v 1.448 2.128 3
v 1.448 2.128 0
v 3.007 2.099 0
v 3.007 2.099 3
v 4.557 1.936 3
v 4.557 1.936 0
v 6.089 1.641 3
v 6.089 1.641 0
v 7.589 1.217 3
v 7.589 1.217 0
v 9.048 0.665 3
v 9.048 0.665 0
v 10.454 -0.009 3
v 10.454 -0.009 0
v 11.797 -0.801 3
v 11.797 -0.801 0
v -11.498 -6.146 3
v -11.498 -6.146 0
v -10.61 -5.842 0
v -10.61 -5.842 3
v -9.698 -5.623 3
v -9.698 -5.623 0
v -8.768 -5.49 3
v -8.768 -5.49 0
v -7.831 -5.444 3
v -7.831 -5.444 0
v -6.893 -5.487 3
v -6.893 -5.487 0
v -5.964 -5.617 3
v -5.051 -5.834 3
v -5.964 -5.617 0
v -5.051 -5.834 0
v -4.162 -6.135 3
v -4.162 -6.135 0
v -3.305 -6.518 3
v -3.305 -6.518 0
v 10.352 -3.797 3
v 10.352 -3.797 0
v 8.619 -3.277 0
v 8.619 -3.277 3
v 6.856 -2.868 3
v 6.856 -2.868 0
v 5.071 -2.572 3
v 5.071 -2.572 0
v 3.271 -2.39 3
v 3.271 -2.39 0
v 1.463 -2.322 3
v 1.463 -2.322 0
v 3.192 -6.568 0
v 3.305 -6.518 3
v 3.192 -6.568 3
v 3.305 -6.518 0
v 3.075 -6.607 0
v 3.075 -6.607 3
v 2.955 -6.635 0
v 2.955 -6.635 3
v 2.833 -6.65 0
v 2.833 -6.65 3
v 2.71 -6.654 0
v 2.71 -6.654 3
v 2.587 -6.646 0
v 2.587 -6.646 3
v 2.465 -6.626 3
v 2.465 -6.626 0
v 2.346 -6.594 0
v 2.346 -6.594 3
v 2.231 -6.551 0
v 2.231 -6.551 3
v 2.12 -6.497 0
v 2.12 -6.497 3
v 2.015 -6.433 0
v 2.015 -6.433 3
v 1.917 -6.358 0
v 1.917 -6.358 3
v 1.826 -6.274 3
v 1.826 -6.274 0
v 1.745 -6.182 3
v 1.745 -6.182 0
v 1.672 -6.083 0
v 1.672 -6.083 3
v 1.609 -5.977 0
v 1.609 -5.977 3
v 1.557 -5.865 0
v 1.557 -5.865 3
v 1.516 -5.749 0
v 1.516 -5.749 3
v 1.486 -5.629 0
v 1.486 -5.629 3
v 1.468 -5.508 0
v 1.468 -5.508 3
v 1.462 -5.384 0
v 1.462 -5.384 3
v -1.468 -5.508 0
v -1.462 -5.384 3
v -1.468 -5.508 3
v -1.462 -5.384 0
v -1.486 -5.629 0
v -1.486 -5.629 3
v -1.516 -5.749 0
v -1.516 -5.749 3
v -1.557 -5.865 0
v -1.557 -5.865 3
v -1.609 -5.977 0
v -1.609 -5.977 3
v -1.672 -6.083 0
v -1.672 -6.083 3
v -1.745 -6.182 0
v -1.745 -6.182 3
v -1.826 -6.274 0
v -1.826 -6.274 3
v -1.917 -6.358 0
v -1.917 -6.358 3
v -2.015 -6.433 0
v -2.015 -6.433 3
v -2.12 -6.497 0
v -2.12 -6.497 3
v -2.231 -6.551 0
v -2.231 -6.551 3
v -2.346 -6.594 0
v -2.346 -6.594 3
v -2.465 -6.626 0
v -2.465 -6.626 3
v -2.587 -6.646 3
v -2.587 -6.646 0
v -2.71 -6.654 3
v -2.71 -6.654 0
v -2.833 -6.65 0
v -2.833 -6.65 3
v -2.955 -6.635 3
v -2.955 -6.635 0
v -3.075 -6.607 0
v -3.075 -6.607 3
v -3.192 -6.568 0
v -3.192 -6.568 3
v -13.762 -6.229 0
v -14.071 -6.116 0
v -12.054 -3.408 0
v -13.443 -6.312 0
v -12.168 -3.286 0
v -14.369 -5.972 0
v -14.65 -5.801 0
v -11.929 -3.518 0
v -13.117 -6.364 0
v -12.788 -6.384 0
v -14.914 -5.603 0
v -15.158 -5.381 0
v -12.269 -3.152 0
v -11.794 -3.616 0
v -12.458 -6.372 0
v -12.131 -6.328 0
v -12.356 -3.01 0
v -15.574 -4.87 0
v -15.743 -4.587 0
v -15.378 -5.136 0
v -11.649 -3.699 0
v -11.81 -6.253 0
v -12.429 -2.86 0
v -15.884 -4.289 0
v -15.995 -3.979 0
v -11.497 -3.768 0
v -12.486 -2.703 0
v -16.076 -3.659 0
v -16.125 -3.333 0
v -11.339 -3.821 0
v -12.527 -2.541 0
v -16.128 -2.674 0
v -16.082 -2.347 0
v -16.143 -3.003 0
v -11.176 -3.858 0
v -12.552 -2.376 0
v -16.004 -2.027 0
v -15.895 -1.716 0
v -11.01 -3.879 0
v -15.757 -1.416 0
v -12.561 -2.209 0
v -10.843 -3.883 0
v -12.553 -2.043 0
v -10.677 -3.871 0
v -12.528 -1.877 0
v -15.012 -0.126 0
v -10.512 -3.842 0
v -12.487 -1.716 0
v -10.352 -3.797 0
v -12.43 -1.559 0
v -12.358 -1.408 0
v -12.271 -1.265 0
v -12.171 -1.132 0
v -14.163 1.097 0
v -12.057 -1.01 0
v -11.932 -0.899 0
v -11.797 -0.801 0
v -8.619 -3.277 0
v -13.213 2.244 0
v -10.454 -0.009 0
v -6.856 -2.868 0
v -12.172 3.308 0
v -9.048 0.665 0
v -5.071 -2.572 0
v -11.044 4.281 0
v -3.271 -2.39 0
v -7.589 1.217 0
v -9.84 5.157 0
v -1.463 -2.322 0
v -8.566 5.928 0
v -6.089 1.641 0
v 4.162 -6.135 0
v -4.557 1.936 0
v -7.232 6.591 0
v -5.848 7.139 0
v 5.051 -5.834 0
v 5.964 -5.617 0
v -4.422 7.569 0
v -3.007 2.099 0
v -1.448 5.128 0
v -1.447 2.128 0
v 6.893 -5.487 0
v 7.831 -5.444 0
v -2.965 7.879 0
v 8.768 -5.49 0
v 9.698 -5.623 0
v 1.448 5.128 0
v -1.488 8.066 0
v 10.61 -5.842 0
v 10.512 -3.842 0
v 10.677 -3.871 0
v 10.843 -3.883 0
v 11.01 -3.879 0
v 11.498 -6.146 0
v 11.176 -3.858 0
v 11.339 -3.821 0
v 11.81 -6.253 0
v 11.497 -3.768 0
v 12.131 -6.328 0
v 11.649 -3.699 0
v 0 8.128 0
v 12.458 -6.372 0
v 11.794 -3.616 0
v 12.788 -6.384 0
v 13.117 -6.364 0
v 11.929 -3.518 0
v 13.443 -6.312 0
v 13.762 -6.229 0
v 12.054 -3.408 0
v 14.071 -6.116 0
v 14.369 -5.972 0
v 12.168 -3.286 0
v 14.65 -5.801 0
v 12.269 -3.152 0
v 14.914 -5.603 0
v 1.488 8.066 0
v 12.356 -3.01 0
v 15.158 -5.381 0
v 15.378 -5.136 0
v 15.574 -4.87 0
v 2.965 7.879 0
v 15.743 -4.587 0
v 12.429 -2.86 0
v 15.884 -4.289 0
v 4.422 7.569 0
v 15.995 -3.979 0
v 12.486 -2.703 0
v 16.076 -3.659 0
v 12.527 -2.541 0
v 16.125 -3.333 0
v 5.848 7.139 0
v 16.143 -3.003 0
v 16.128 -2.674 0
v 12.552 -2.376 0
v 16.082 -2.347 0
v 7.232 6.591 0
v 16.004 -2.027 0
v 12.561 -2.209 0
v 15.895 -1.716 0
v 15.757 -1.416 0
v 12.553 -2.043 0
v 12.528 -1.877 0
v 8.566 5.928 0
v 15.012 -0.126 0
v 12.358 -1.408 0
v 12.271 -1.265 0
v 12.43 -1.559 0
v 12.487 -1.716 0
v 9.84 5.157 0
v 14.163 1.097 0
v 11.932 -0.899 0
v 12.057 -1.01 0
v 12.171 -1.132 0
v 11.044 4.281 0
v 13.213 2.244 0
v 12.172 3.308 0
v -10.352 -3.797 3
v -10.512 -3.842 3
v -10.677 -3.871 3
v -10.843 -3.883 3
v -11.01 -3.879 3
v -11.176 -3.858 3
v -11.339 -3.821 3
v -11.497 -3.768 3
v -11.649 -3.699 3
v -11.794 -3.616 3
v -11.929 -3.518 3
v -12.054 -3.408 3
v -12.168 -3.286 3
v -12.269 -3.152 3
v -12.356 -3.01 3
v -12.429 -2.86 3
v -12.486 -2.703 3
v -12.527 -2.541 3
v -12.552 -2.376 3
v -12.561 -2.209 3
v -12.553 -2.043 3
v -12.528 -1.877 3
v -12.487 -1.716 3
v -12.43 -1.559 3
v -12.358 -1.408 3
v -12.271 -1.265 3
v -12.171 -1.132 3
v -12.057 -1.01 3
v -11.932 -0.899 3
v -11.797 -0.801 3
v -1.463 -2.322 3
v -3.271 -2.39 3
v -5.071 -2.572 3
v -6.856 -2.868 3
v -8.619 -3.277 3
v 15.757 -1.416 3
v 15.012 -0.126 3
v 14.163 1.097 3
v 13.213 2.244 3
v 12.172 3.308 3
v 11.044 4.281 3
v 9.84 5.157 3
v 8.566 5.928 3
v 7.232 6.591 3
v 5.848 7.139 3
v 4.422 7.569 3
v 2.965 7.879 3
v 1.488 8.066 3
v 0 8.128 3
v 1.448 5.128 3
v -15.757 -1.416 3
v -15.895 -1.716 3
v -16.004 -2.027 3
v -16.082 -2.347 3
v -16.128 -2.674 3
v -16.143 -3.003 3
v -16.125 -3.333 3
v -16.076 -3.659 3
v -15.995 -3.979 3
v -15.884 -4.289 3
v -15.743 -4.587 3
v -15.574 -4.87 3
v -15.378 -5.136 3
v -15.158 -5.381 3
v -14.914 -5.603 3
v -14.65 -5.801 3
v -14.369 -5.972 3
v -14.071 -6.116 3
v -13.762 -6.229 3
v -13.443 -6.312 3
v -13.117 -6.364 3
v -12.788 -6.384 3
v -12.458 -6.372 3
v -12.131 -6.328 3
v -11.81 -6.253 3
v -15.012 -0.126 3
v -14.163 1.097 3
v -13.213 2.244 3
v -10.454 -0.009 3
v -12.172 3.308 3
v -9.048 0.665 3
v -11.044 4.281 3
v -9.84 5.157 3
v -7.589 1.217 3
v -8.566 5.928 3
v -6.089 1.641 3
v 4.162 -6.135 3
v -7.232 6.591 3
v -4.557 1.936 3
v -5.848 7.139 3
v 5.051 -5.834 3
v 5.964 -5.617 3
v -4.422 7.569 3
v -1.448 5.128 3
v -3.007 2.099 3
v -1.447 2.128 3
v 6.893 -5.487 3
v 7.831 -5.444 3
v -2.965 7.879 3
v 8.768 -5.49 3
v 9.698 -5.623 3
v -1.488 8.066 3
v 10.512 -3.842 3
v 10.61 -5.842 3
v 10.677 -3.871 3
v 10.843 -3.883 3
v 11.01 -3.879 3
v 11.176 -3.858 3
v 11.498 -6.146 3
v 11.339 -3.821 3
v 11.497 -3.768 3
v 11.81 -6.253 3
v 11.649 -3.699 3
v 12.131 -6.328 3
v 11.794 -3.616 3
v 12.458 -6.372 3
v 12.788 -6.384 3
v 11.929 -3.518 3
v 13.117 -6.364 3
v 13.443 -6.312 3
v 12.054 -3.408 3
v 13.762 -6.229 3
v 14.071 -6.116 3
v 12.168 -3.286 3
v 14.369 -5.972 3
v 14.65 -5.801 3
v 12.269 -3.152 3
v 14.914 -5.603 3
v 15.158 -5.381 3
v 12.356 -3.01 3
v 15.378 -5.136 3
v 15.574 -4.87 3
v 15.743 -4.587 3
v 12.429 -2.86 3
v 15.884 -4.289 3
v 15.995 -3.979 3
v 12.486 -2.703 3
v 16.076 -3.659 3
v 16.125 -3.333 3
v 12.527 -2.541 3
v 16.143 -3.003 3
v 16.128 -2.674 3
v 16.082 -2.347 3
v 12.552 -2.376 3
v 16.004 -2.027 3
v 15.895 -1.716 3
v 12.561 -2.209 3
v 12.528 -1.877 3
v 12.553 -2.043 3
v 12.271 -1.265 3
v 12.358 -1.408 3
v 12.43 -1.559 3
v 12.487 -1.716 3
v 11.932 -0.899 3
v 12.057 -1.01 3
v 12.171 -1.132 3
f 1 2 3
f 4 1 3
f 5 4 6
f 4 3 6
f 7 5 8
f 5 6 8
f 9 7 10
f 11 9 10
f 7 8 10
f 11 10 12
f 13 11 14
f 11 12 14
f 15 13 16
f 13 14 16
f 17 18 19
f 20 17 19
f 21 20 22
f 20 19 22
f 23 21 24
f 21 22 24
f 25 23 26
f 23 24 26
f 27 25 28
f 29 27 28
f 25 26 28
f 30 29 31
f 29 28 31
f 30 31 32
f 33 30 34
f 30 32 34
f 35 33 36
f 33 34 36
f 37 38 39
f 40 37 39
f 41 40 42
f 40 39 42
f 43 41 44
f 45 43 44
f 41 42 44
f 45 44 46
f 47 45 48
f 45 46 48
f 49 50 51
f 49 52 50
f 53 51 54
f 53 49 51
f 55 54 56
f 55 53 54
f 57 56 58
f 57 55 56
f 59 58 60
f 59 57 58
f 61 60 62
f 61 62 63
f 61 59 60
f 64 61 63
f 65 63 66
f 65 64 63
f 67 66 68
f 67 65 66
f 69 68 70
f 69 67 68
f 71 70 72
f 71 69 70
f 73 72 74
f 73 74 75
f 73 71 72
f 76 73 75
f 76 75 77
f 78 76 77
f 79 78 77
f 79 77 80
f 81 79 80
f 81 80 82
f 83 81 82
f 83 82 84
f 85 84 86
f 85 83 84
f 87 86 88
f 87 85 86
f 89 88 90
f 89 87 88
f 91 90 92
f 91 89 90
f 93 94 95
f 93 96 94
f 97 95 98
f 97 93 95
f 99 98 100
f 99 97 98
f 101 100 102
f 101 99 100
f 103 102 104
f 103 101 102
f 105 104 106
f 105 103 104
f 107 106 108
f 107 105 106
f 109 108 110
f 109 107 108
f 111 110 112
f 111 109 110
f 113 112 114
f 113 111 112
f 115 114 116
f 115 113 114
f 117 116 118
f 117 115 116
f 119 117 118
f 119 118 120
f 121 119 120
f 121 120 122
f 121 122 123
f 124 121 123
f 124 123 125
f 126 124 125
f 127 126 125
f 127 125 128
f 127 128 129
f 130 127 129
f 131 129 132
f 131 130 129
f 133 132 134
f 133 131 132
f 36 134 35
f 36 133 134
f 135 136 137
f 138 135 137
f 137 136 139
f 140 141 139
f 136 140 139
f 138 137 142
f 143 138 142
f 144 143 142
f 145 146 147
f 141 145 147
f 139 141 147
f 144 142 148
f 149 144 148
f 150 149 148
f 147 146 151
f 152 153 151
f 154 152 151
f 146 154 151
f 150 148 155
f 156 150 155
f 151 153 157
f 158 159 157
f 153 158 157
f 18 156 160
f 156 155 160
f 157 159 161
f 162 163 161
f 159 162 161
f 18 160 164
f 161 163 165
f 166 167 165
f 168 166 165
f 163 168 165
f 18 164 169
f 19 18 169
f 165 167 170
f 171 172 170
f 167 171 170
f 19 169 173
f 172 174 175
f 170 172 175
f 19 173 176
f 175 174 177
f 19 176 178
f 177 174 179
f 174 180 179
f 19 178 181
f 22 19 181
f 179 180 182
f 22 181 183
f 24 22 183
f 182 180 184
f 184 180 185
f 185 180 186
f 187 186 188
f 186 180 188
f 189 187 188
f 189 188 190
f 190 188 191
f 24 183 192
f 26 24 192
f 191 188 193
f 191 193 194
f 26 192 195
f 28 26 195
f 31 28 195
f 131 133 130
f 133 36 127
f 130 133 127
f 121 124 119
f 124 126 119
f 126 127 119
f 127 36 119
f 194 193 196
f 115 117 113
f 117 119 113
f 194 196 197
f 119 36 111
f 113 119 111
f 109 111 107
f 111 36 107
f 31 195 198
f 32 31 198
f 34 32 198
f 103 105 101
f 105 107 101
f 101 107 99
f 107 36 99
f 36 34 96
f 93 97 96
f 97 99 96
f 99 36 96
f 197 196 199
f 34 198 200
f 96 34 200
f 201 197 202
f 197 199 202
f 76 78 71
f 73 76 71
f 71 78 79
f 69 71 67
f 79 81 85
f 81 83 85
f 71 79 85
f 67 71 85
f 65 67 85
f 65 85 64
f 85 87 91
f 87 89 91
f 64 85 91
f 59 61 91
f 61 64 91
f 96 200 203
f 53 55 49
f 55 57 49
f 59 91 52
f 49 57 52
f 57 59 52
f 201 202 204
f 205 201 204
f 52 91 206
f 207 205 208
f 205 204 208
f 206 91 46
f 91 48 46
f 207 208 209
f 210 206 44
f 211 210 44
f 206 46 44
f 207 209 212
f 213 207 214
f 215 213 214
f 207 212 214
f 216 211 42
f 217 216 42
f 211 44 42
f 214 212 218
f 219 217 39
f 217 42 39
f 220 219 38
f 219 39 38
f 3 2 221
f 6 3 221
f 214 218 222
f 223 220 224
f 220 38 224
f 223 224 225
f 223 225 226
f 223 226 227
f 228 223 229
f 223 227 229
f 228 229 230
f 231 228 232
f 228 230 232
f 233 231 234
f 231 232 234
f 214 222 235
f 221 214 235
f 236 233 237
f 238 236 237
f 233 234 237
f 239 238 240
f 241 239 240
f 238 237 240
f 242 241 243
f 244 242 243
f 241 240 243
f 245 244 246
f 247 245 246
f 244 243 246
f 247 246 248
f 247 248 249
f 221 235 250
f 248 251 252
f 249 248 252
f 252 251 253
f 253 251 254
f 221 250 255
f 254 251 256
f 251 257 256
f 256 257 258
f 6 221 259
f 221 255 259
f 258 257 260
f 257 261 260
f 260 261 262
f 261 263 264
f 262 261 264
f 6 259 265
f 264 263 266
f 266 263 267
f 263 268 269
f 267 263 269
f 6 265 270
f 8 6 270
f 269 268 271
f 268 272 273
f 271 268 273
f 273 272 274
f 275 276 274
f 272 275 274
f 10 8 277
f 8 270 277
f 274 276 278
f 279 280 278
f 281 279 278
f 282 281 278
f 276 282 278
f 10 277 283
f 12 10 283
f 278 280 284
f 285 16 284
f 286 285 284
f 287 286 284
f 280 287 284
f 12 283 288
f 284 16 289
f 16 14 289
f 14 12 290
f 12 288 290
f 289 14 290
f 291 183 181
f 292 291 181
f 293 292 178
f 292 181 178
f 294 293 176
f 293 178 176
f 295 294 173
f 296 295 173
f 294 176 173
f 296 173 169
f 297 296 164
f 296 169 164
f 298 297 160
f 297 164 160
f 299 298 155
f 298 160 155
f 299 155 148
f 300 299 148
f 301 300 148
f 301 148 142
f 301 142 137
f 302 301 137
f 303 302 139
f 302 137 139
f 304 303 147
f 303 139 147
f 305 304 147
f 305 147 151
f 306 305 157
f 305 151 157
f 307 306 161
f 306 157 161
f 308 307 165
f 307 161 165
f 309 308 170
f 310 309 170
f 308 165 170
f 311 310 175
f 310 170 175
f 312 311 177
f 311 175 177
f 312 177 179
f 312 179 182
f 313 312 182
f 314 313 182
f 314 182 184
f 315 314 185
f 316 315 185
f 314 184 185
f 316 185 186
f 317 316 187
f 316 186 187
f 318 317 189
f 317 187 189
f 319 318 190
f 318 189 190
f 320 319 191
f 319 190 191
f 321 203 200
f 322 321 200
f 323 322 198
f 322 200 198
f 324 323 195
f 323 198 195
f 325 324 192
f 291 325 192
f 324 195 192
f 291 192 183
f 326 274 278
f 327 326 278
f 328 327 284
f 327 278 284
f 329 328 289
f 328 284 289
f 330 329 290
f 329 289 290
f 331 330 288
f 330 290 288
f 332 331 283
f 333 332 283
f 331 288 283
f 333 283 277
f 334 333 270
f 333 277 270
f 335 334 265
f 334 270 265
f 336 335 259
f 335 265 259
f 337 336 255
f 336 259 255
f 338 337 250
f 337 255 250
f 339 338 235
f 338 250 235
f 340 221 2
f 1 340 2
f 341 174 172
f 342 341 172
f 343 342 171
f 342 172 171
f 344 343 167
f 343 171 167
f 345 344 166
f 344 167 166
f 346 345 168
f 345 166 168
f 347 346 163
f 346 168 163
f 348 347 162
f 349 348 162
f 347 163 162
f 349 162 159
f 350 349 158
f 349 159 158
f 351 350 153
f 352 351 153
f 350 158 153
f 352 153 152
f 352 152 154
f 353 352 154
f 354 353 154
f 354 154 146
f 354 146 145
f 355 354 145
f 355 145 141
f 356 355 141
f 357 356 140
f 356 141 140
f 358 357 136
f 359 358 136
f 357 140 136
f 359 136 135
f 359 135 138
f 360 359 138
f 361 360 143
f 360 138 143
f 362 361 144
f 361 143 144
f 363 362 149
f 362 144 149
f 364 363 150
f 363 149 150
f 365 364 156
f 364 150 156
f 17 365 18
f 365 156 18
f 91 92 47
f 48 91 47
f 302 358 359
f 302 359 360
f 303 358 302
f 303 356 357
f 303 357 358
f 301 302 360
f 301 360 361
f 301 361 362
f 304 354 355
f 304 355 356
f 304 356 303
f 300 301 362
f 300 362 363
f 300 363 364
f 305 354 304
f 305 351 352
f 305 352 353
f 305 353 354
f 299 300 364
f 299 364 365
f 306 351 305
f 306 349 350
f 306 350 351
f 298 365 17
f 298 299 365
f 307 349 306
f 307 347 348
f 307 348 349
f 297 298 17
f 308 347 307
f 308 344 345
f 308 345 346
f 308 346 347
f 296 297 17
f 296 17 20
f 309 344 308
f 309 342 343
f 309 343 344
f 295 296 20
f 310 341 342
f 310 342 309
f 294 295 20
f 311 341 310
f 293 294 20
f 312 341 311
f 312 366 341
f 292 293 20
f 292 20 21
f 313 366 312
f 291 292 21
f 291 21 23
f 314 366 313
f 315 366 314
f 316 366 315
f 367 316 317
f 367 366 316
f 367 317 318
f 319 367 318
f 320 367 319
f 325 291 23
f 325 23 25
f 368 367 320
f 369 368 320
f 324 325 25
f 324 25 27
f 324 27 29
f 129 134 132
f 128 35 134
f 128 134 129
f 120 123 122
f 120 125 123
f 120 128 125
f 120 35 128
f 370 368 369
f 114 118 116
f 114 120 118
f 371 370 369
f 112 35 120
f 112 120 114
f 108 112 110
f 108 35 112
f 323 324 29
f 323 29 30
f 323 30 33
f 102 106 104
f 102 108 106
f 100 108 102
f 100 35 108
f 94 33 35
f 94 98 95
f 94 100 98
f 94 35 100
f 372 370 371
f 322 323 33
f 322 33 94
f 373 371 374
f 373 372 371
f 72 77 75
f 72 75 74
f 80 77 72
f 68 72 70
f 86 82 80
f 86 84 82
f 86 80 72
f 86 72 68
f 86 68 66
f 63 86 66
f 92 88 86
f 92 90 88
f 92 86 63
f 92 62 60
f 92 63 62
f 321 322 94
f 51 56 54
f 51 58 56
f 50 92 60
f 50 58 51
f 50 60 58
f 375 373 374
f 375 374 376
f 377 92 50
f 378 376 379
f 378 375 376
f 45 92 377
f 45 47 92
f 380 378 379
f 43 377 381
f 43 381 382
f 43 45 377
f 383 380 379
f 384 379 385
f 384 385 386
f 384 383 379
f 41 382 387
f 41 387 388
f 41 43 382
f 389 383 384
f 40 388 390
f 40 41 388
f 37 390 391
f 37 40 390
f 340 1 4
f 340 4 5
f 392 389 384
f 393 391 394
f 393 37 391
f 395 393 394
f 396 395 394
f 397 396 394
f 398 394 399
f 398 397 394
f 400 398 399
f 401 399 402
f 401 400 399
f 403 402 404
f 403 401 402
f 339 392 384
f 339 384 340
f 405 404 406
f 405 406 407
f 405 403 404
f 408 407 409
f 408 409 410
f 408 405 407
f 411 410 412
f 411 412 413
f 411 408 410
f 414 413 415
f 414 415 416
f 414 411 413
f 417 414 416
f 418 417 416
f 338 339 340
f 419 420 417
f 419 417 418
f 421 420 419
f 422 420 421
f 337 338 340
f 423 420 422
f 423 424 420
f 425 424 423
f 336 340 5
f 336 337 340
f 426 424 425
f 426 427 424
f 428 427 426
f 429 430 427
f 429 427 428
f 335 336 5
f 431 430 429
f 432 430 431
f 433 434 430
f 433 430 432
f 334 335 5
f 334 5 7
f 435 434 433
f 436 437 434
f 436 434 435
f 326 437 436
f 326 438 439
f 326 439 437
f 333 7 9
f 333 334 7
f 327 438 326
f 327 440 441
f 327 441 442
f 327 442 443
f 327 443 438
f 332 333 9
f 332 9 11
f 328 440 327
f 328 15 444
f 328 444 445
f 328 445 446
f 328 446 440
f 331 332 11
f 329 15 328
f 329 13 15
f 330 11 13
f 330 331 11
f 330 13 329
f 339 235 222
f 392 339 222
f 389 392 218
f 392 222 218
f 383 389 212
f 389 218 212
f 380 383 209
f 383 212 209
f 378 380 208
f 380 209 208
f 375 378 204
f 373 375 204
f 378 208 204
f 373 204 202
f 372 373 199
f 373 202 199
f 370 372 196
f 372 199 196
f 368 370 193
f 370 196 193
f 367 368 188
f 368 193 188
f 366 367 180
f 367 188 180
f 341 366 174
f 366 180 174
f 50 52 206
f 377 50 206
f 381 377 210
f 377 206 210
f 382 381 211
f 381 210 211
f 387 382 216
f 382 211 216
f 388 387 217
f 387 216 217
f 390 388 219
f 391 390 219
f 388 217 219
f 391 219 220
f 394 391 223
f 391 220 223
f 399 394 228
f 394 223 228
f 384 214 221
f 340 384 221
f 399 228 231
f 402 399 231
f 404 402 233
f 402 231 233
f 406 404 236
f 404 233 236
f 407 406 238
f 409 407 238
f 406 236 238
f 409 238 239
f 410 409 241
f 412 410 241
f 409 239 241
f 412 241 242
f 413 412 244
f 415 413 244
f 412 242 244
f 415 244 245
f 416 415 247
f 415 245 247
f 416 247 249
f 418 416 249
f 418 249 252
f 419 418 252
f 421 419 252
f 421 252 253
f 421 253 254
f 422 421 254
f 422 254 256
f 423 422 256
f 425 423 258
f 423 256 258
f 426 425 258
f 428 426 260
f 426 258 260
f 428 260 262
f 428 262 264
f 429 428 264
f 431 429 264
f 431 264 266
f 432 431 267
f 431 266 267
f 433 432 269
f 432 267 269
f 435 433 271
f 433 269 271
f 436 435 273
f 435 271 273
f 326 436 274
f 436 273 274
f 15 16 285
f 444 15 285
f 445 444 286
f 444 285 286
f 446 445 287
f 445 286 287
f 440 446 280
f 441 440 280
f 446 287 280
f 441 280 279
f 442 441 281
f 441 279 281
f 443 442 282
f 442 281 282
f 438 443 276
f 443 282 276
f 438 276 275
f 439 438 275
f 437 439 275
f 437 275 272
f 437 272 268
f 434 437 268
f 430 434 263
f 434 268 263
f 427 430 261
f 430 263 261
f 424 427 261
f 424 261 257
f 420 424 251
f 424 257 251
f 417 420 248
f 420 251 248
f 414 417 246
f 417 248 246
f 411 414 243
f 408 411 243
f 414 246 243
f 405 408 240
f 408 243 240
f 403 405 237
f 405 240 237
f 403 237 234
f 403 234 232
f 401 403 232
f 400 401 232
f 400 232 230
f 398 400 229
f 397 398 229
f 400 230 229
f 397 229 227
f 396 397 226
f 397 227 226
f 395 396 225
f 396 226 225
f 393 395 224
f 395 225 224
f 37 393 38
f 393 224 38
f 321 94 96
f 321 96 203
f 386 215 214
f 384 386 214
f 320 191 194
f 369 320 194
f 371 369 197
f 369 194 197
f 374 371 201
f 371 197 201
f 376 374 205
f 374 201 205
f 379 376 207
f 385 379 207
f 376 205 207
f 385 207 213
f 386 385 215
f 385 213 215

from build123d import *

# Parameters (mm, degrees)
EXTRUDE_1_DEPTH     = 3
SKETCH_2_W          = 2.925
SKETCH_2_H          = 8.058162309
CUT_EXTRUDE_1_DEPTH = 3
FILLET_1_R          = 1.27


with BuildPart() as part:
    # 스케치1 → 보스-돌출1 (new body)
    with BuildSketch(Plane.XY):
        with BuildLine():
            Line((-1.4475, 2.128), (-1.4475, 5.128))
            Line((-1.4475, 5.128), (1.4475, 5.128))
            Line((1.4475, 5.128), (1.4475, 2.128))
            ThreePointArc((1.4475, 2.128), (6.843352857, 1.44491364), (11.796869597, -0.801084345))
            ThreePointArc((11.796869597, -0.801084345), (12.394248626, -2.935784128), (10.351605925, -3.7968391))
            ThreePointArc((10.351605925, -3.7968391), (5.891355798, -2.693189603), (1.311601441, -2.322078509))
            Line((1.311601441, -2.322078509), (1.311601441, -7.845124291))
            ThreePointArc((1.311601441, -7.845124291), (6.16890602, -5.580674334), (11.498183086, -6.146313204))
            ThreePointArc((11.498183086, -6.146313204), (15.270849943, -5.260819217), (15.756720066, -1.416206748))
            ThreePointArc((15.756720066, -1.416206748), (9.210946066, 5.555889316), (0, 8.128))
            ThreePointArc((0, 8.128), (-9.210946066, 5.555889316), (-15.756720066, -1.416206748))
            ThreePointArc((-15.756720066, -1.416206748), (-15.270849943, -5.260819217), (-11.498183086, -6.146313204))
            ThreePointArc((-11.498183086, -6.146313204), (-6.16890602, -5.580674334), (-1.311601441, -7.845124291))
            Line((-1.311601441, -7.845124291), (-1.311601441, -2.322078509))
            ThreePointArc((-1.311601441, -2.322078509), (-5.891355798, -2.693189603), (-10.351605925, -3.7968391))
            ThreePointArc((-10.351605925, -3.7968391), (-12.394248626, -2.935784128), (-11.796869597, -0.801084345))
            ThreePointArc((-11.796869597, -0.801084345), (-6.843352857, 1.44491364), (-1.4475, 2.128))
        make_face()
    extrude(amount=EXTRUDE_1_DEPTH)

    # 스케치2 → 컷-돌출1 (cut)
    with BuildSketch(Plane.XY.offset(3)):
        with Locations((0, -5.233231355)):
            Rectangle(SKETCH_2_W, SKETCH_2_H)
    extrude(amount=-CUT_EXTRUDE_1_DEPTH, mode=Mode.SUBTRACT)

    # 필렛1
    fillet_1_edges = [part.edges().sort_by_distance(p)[0] for p in [
        (1.4625, -7.718694121, 1.5),
        (-1.4625, -7.718694121, 1.5),
    ]]
    fillet(fillet_1_edges, radius=FILLET_1_R)


solid = part.part
